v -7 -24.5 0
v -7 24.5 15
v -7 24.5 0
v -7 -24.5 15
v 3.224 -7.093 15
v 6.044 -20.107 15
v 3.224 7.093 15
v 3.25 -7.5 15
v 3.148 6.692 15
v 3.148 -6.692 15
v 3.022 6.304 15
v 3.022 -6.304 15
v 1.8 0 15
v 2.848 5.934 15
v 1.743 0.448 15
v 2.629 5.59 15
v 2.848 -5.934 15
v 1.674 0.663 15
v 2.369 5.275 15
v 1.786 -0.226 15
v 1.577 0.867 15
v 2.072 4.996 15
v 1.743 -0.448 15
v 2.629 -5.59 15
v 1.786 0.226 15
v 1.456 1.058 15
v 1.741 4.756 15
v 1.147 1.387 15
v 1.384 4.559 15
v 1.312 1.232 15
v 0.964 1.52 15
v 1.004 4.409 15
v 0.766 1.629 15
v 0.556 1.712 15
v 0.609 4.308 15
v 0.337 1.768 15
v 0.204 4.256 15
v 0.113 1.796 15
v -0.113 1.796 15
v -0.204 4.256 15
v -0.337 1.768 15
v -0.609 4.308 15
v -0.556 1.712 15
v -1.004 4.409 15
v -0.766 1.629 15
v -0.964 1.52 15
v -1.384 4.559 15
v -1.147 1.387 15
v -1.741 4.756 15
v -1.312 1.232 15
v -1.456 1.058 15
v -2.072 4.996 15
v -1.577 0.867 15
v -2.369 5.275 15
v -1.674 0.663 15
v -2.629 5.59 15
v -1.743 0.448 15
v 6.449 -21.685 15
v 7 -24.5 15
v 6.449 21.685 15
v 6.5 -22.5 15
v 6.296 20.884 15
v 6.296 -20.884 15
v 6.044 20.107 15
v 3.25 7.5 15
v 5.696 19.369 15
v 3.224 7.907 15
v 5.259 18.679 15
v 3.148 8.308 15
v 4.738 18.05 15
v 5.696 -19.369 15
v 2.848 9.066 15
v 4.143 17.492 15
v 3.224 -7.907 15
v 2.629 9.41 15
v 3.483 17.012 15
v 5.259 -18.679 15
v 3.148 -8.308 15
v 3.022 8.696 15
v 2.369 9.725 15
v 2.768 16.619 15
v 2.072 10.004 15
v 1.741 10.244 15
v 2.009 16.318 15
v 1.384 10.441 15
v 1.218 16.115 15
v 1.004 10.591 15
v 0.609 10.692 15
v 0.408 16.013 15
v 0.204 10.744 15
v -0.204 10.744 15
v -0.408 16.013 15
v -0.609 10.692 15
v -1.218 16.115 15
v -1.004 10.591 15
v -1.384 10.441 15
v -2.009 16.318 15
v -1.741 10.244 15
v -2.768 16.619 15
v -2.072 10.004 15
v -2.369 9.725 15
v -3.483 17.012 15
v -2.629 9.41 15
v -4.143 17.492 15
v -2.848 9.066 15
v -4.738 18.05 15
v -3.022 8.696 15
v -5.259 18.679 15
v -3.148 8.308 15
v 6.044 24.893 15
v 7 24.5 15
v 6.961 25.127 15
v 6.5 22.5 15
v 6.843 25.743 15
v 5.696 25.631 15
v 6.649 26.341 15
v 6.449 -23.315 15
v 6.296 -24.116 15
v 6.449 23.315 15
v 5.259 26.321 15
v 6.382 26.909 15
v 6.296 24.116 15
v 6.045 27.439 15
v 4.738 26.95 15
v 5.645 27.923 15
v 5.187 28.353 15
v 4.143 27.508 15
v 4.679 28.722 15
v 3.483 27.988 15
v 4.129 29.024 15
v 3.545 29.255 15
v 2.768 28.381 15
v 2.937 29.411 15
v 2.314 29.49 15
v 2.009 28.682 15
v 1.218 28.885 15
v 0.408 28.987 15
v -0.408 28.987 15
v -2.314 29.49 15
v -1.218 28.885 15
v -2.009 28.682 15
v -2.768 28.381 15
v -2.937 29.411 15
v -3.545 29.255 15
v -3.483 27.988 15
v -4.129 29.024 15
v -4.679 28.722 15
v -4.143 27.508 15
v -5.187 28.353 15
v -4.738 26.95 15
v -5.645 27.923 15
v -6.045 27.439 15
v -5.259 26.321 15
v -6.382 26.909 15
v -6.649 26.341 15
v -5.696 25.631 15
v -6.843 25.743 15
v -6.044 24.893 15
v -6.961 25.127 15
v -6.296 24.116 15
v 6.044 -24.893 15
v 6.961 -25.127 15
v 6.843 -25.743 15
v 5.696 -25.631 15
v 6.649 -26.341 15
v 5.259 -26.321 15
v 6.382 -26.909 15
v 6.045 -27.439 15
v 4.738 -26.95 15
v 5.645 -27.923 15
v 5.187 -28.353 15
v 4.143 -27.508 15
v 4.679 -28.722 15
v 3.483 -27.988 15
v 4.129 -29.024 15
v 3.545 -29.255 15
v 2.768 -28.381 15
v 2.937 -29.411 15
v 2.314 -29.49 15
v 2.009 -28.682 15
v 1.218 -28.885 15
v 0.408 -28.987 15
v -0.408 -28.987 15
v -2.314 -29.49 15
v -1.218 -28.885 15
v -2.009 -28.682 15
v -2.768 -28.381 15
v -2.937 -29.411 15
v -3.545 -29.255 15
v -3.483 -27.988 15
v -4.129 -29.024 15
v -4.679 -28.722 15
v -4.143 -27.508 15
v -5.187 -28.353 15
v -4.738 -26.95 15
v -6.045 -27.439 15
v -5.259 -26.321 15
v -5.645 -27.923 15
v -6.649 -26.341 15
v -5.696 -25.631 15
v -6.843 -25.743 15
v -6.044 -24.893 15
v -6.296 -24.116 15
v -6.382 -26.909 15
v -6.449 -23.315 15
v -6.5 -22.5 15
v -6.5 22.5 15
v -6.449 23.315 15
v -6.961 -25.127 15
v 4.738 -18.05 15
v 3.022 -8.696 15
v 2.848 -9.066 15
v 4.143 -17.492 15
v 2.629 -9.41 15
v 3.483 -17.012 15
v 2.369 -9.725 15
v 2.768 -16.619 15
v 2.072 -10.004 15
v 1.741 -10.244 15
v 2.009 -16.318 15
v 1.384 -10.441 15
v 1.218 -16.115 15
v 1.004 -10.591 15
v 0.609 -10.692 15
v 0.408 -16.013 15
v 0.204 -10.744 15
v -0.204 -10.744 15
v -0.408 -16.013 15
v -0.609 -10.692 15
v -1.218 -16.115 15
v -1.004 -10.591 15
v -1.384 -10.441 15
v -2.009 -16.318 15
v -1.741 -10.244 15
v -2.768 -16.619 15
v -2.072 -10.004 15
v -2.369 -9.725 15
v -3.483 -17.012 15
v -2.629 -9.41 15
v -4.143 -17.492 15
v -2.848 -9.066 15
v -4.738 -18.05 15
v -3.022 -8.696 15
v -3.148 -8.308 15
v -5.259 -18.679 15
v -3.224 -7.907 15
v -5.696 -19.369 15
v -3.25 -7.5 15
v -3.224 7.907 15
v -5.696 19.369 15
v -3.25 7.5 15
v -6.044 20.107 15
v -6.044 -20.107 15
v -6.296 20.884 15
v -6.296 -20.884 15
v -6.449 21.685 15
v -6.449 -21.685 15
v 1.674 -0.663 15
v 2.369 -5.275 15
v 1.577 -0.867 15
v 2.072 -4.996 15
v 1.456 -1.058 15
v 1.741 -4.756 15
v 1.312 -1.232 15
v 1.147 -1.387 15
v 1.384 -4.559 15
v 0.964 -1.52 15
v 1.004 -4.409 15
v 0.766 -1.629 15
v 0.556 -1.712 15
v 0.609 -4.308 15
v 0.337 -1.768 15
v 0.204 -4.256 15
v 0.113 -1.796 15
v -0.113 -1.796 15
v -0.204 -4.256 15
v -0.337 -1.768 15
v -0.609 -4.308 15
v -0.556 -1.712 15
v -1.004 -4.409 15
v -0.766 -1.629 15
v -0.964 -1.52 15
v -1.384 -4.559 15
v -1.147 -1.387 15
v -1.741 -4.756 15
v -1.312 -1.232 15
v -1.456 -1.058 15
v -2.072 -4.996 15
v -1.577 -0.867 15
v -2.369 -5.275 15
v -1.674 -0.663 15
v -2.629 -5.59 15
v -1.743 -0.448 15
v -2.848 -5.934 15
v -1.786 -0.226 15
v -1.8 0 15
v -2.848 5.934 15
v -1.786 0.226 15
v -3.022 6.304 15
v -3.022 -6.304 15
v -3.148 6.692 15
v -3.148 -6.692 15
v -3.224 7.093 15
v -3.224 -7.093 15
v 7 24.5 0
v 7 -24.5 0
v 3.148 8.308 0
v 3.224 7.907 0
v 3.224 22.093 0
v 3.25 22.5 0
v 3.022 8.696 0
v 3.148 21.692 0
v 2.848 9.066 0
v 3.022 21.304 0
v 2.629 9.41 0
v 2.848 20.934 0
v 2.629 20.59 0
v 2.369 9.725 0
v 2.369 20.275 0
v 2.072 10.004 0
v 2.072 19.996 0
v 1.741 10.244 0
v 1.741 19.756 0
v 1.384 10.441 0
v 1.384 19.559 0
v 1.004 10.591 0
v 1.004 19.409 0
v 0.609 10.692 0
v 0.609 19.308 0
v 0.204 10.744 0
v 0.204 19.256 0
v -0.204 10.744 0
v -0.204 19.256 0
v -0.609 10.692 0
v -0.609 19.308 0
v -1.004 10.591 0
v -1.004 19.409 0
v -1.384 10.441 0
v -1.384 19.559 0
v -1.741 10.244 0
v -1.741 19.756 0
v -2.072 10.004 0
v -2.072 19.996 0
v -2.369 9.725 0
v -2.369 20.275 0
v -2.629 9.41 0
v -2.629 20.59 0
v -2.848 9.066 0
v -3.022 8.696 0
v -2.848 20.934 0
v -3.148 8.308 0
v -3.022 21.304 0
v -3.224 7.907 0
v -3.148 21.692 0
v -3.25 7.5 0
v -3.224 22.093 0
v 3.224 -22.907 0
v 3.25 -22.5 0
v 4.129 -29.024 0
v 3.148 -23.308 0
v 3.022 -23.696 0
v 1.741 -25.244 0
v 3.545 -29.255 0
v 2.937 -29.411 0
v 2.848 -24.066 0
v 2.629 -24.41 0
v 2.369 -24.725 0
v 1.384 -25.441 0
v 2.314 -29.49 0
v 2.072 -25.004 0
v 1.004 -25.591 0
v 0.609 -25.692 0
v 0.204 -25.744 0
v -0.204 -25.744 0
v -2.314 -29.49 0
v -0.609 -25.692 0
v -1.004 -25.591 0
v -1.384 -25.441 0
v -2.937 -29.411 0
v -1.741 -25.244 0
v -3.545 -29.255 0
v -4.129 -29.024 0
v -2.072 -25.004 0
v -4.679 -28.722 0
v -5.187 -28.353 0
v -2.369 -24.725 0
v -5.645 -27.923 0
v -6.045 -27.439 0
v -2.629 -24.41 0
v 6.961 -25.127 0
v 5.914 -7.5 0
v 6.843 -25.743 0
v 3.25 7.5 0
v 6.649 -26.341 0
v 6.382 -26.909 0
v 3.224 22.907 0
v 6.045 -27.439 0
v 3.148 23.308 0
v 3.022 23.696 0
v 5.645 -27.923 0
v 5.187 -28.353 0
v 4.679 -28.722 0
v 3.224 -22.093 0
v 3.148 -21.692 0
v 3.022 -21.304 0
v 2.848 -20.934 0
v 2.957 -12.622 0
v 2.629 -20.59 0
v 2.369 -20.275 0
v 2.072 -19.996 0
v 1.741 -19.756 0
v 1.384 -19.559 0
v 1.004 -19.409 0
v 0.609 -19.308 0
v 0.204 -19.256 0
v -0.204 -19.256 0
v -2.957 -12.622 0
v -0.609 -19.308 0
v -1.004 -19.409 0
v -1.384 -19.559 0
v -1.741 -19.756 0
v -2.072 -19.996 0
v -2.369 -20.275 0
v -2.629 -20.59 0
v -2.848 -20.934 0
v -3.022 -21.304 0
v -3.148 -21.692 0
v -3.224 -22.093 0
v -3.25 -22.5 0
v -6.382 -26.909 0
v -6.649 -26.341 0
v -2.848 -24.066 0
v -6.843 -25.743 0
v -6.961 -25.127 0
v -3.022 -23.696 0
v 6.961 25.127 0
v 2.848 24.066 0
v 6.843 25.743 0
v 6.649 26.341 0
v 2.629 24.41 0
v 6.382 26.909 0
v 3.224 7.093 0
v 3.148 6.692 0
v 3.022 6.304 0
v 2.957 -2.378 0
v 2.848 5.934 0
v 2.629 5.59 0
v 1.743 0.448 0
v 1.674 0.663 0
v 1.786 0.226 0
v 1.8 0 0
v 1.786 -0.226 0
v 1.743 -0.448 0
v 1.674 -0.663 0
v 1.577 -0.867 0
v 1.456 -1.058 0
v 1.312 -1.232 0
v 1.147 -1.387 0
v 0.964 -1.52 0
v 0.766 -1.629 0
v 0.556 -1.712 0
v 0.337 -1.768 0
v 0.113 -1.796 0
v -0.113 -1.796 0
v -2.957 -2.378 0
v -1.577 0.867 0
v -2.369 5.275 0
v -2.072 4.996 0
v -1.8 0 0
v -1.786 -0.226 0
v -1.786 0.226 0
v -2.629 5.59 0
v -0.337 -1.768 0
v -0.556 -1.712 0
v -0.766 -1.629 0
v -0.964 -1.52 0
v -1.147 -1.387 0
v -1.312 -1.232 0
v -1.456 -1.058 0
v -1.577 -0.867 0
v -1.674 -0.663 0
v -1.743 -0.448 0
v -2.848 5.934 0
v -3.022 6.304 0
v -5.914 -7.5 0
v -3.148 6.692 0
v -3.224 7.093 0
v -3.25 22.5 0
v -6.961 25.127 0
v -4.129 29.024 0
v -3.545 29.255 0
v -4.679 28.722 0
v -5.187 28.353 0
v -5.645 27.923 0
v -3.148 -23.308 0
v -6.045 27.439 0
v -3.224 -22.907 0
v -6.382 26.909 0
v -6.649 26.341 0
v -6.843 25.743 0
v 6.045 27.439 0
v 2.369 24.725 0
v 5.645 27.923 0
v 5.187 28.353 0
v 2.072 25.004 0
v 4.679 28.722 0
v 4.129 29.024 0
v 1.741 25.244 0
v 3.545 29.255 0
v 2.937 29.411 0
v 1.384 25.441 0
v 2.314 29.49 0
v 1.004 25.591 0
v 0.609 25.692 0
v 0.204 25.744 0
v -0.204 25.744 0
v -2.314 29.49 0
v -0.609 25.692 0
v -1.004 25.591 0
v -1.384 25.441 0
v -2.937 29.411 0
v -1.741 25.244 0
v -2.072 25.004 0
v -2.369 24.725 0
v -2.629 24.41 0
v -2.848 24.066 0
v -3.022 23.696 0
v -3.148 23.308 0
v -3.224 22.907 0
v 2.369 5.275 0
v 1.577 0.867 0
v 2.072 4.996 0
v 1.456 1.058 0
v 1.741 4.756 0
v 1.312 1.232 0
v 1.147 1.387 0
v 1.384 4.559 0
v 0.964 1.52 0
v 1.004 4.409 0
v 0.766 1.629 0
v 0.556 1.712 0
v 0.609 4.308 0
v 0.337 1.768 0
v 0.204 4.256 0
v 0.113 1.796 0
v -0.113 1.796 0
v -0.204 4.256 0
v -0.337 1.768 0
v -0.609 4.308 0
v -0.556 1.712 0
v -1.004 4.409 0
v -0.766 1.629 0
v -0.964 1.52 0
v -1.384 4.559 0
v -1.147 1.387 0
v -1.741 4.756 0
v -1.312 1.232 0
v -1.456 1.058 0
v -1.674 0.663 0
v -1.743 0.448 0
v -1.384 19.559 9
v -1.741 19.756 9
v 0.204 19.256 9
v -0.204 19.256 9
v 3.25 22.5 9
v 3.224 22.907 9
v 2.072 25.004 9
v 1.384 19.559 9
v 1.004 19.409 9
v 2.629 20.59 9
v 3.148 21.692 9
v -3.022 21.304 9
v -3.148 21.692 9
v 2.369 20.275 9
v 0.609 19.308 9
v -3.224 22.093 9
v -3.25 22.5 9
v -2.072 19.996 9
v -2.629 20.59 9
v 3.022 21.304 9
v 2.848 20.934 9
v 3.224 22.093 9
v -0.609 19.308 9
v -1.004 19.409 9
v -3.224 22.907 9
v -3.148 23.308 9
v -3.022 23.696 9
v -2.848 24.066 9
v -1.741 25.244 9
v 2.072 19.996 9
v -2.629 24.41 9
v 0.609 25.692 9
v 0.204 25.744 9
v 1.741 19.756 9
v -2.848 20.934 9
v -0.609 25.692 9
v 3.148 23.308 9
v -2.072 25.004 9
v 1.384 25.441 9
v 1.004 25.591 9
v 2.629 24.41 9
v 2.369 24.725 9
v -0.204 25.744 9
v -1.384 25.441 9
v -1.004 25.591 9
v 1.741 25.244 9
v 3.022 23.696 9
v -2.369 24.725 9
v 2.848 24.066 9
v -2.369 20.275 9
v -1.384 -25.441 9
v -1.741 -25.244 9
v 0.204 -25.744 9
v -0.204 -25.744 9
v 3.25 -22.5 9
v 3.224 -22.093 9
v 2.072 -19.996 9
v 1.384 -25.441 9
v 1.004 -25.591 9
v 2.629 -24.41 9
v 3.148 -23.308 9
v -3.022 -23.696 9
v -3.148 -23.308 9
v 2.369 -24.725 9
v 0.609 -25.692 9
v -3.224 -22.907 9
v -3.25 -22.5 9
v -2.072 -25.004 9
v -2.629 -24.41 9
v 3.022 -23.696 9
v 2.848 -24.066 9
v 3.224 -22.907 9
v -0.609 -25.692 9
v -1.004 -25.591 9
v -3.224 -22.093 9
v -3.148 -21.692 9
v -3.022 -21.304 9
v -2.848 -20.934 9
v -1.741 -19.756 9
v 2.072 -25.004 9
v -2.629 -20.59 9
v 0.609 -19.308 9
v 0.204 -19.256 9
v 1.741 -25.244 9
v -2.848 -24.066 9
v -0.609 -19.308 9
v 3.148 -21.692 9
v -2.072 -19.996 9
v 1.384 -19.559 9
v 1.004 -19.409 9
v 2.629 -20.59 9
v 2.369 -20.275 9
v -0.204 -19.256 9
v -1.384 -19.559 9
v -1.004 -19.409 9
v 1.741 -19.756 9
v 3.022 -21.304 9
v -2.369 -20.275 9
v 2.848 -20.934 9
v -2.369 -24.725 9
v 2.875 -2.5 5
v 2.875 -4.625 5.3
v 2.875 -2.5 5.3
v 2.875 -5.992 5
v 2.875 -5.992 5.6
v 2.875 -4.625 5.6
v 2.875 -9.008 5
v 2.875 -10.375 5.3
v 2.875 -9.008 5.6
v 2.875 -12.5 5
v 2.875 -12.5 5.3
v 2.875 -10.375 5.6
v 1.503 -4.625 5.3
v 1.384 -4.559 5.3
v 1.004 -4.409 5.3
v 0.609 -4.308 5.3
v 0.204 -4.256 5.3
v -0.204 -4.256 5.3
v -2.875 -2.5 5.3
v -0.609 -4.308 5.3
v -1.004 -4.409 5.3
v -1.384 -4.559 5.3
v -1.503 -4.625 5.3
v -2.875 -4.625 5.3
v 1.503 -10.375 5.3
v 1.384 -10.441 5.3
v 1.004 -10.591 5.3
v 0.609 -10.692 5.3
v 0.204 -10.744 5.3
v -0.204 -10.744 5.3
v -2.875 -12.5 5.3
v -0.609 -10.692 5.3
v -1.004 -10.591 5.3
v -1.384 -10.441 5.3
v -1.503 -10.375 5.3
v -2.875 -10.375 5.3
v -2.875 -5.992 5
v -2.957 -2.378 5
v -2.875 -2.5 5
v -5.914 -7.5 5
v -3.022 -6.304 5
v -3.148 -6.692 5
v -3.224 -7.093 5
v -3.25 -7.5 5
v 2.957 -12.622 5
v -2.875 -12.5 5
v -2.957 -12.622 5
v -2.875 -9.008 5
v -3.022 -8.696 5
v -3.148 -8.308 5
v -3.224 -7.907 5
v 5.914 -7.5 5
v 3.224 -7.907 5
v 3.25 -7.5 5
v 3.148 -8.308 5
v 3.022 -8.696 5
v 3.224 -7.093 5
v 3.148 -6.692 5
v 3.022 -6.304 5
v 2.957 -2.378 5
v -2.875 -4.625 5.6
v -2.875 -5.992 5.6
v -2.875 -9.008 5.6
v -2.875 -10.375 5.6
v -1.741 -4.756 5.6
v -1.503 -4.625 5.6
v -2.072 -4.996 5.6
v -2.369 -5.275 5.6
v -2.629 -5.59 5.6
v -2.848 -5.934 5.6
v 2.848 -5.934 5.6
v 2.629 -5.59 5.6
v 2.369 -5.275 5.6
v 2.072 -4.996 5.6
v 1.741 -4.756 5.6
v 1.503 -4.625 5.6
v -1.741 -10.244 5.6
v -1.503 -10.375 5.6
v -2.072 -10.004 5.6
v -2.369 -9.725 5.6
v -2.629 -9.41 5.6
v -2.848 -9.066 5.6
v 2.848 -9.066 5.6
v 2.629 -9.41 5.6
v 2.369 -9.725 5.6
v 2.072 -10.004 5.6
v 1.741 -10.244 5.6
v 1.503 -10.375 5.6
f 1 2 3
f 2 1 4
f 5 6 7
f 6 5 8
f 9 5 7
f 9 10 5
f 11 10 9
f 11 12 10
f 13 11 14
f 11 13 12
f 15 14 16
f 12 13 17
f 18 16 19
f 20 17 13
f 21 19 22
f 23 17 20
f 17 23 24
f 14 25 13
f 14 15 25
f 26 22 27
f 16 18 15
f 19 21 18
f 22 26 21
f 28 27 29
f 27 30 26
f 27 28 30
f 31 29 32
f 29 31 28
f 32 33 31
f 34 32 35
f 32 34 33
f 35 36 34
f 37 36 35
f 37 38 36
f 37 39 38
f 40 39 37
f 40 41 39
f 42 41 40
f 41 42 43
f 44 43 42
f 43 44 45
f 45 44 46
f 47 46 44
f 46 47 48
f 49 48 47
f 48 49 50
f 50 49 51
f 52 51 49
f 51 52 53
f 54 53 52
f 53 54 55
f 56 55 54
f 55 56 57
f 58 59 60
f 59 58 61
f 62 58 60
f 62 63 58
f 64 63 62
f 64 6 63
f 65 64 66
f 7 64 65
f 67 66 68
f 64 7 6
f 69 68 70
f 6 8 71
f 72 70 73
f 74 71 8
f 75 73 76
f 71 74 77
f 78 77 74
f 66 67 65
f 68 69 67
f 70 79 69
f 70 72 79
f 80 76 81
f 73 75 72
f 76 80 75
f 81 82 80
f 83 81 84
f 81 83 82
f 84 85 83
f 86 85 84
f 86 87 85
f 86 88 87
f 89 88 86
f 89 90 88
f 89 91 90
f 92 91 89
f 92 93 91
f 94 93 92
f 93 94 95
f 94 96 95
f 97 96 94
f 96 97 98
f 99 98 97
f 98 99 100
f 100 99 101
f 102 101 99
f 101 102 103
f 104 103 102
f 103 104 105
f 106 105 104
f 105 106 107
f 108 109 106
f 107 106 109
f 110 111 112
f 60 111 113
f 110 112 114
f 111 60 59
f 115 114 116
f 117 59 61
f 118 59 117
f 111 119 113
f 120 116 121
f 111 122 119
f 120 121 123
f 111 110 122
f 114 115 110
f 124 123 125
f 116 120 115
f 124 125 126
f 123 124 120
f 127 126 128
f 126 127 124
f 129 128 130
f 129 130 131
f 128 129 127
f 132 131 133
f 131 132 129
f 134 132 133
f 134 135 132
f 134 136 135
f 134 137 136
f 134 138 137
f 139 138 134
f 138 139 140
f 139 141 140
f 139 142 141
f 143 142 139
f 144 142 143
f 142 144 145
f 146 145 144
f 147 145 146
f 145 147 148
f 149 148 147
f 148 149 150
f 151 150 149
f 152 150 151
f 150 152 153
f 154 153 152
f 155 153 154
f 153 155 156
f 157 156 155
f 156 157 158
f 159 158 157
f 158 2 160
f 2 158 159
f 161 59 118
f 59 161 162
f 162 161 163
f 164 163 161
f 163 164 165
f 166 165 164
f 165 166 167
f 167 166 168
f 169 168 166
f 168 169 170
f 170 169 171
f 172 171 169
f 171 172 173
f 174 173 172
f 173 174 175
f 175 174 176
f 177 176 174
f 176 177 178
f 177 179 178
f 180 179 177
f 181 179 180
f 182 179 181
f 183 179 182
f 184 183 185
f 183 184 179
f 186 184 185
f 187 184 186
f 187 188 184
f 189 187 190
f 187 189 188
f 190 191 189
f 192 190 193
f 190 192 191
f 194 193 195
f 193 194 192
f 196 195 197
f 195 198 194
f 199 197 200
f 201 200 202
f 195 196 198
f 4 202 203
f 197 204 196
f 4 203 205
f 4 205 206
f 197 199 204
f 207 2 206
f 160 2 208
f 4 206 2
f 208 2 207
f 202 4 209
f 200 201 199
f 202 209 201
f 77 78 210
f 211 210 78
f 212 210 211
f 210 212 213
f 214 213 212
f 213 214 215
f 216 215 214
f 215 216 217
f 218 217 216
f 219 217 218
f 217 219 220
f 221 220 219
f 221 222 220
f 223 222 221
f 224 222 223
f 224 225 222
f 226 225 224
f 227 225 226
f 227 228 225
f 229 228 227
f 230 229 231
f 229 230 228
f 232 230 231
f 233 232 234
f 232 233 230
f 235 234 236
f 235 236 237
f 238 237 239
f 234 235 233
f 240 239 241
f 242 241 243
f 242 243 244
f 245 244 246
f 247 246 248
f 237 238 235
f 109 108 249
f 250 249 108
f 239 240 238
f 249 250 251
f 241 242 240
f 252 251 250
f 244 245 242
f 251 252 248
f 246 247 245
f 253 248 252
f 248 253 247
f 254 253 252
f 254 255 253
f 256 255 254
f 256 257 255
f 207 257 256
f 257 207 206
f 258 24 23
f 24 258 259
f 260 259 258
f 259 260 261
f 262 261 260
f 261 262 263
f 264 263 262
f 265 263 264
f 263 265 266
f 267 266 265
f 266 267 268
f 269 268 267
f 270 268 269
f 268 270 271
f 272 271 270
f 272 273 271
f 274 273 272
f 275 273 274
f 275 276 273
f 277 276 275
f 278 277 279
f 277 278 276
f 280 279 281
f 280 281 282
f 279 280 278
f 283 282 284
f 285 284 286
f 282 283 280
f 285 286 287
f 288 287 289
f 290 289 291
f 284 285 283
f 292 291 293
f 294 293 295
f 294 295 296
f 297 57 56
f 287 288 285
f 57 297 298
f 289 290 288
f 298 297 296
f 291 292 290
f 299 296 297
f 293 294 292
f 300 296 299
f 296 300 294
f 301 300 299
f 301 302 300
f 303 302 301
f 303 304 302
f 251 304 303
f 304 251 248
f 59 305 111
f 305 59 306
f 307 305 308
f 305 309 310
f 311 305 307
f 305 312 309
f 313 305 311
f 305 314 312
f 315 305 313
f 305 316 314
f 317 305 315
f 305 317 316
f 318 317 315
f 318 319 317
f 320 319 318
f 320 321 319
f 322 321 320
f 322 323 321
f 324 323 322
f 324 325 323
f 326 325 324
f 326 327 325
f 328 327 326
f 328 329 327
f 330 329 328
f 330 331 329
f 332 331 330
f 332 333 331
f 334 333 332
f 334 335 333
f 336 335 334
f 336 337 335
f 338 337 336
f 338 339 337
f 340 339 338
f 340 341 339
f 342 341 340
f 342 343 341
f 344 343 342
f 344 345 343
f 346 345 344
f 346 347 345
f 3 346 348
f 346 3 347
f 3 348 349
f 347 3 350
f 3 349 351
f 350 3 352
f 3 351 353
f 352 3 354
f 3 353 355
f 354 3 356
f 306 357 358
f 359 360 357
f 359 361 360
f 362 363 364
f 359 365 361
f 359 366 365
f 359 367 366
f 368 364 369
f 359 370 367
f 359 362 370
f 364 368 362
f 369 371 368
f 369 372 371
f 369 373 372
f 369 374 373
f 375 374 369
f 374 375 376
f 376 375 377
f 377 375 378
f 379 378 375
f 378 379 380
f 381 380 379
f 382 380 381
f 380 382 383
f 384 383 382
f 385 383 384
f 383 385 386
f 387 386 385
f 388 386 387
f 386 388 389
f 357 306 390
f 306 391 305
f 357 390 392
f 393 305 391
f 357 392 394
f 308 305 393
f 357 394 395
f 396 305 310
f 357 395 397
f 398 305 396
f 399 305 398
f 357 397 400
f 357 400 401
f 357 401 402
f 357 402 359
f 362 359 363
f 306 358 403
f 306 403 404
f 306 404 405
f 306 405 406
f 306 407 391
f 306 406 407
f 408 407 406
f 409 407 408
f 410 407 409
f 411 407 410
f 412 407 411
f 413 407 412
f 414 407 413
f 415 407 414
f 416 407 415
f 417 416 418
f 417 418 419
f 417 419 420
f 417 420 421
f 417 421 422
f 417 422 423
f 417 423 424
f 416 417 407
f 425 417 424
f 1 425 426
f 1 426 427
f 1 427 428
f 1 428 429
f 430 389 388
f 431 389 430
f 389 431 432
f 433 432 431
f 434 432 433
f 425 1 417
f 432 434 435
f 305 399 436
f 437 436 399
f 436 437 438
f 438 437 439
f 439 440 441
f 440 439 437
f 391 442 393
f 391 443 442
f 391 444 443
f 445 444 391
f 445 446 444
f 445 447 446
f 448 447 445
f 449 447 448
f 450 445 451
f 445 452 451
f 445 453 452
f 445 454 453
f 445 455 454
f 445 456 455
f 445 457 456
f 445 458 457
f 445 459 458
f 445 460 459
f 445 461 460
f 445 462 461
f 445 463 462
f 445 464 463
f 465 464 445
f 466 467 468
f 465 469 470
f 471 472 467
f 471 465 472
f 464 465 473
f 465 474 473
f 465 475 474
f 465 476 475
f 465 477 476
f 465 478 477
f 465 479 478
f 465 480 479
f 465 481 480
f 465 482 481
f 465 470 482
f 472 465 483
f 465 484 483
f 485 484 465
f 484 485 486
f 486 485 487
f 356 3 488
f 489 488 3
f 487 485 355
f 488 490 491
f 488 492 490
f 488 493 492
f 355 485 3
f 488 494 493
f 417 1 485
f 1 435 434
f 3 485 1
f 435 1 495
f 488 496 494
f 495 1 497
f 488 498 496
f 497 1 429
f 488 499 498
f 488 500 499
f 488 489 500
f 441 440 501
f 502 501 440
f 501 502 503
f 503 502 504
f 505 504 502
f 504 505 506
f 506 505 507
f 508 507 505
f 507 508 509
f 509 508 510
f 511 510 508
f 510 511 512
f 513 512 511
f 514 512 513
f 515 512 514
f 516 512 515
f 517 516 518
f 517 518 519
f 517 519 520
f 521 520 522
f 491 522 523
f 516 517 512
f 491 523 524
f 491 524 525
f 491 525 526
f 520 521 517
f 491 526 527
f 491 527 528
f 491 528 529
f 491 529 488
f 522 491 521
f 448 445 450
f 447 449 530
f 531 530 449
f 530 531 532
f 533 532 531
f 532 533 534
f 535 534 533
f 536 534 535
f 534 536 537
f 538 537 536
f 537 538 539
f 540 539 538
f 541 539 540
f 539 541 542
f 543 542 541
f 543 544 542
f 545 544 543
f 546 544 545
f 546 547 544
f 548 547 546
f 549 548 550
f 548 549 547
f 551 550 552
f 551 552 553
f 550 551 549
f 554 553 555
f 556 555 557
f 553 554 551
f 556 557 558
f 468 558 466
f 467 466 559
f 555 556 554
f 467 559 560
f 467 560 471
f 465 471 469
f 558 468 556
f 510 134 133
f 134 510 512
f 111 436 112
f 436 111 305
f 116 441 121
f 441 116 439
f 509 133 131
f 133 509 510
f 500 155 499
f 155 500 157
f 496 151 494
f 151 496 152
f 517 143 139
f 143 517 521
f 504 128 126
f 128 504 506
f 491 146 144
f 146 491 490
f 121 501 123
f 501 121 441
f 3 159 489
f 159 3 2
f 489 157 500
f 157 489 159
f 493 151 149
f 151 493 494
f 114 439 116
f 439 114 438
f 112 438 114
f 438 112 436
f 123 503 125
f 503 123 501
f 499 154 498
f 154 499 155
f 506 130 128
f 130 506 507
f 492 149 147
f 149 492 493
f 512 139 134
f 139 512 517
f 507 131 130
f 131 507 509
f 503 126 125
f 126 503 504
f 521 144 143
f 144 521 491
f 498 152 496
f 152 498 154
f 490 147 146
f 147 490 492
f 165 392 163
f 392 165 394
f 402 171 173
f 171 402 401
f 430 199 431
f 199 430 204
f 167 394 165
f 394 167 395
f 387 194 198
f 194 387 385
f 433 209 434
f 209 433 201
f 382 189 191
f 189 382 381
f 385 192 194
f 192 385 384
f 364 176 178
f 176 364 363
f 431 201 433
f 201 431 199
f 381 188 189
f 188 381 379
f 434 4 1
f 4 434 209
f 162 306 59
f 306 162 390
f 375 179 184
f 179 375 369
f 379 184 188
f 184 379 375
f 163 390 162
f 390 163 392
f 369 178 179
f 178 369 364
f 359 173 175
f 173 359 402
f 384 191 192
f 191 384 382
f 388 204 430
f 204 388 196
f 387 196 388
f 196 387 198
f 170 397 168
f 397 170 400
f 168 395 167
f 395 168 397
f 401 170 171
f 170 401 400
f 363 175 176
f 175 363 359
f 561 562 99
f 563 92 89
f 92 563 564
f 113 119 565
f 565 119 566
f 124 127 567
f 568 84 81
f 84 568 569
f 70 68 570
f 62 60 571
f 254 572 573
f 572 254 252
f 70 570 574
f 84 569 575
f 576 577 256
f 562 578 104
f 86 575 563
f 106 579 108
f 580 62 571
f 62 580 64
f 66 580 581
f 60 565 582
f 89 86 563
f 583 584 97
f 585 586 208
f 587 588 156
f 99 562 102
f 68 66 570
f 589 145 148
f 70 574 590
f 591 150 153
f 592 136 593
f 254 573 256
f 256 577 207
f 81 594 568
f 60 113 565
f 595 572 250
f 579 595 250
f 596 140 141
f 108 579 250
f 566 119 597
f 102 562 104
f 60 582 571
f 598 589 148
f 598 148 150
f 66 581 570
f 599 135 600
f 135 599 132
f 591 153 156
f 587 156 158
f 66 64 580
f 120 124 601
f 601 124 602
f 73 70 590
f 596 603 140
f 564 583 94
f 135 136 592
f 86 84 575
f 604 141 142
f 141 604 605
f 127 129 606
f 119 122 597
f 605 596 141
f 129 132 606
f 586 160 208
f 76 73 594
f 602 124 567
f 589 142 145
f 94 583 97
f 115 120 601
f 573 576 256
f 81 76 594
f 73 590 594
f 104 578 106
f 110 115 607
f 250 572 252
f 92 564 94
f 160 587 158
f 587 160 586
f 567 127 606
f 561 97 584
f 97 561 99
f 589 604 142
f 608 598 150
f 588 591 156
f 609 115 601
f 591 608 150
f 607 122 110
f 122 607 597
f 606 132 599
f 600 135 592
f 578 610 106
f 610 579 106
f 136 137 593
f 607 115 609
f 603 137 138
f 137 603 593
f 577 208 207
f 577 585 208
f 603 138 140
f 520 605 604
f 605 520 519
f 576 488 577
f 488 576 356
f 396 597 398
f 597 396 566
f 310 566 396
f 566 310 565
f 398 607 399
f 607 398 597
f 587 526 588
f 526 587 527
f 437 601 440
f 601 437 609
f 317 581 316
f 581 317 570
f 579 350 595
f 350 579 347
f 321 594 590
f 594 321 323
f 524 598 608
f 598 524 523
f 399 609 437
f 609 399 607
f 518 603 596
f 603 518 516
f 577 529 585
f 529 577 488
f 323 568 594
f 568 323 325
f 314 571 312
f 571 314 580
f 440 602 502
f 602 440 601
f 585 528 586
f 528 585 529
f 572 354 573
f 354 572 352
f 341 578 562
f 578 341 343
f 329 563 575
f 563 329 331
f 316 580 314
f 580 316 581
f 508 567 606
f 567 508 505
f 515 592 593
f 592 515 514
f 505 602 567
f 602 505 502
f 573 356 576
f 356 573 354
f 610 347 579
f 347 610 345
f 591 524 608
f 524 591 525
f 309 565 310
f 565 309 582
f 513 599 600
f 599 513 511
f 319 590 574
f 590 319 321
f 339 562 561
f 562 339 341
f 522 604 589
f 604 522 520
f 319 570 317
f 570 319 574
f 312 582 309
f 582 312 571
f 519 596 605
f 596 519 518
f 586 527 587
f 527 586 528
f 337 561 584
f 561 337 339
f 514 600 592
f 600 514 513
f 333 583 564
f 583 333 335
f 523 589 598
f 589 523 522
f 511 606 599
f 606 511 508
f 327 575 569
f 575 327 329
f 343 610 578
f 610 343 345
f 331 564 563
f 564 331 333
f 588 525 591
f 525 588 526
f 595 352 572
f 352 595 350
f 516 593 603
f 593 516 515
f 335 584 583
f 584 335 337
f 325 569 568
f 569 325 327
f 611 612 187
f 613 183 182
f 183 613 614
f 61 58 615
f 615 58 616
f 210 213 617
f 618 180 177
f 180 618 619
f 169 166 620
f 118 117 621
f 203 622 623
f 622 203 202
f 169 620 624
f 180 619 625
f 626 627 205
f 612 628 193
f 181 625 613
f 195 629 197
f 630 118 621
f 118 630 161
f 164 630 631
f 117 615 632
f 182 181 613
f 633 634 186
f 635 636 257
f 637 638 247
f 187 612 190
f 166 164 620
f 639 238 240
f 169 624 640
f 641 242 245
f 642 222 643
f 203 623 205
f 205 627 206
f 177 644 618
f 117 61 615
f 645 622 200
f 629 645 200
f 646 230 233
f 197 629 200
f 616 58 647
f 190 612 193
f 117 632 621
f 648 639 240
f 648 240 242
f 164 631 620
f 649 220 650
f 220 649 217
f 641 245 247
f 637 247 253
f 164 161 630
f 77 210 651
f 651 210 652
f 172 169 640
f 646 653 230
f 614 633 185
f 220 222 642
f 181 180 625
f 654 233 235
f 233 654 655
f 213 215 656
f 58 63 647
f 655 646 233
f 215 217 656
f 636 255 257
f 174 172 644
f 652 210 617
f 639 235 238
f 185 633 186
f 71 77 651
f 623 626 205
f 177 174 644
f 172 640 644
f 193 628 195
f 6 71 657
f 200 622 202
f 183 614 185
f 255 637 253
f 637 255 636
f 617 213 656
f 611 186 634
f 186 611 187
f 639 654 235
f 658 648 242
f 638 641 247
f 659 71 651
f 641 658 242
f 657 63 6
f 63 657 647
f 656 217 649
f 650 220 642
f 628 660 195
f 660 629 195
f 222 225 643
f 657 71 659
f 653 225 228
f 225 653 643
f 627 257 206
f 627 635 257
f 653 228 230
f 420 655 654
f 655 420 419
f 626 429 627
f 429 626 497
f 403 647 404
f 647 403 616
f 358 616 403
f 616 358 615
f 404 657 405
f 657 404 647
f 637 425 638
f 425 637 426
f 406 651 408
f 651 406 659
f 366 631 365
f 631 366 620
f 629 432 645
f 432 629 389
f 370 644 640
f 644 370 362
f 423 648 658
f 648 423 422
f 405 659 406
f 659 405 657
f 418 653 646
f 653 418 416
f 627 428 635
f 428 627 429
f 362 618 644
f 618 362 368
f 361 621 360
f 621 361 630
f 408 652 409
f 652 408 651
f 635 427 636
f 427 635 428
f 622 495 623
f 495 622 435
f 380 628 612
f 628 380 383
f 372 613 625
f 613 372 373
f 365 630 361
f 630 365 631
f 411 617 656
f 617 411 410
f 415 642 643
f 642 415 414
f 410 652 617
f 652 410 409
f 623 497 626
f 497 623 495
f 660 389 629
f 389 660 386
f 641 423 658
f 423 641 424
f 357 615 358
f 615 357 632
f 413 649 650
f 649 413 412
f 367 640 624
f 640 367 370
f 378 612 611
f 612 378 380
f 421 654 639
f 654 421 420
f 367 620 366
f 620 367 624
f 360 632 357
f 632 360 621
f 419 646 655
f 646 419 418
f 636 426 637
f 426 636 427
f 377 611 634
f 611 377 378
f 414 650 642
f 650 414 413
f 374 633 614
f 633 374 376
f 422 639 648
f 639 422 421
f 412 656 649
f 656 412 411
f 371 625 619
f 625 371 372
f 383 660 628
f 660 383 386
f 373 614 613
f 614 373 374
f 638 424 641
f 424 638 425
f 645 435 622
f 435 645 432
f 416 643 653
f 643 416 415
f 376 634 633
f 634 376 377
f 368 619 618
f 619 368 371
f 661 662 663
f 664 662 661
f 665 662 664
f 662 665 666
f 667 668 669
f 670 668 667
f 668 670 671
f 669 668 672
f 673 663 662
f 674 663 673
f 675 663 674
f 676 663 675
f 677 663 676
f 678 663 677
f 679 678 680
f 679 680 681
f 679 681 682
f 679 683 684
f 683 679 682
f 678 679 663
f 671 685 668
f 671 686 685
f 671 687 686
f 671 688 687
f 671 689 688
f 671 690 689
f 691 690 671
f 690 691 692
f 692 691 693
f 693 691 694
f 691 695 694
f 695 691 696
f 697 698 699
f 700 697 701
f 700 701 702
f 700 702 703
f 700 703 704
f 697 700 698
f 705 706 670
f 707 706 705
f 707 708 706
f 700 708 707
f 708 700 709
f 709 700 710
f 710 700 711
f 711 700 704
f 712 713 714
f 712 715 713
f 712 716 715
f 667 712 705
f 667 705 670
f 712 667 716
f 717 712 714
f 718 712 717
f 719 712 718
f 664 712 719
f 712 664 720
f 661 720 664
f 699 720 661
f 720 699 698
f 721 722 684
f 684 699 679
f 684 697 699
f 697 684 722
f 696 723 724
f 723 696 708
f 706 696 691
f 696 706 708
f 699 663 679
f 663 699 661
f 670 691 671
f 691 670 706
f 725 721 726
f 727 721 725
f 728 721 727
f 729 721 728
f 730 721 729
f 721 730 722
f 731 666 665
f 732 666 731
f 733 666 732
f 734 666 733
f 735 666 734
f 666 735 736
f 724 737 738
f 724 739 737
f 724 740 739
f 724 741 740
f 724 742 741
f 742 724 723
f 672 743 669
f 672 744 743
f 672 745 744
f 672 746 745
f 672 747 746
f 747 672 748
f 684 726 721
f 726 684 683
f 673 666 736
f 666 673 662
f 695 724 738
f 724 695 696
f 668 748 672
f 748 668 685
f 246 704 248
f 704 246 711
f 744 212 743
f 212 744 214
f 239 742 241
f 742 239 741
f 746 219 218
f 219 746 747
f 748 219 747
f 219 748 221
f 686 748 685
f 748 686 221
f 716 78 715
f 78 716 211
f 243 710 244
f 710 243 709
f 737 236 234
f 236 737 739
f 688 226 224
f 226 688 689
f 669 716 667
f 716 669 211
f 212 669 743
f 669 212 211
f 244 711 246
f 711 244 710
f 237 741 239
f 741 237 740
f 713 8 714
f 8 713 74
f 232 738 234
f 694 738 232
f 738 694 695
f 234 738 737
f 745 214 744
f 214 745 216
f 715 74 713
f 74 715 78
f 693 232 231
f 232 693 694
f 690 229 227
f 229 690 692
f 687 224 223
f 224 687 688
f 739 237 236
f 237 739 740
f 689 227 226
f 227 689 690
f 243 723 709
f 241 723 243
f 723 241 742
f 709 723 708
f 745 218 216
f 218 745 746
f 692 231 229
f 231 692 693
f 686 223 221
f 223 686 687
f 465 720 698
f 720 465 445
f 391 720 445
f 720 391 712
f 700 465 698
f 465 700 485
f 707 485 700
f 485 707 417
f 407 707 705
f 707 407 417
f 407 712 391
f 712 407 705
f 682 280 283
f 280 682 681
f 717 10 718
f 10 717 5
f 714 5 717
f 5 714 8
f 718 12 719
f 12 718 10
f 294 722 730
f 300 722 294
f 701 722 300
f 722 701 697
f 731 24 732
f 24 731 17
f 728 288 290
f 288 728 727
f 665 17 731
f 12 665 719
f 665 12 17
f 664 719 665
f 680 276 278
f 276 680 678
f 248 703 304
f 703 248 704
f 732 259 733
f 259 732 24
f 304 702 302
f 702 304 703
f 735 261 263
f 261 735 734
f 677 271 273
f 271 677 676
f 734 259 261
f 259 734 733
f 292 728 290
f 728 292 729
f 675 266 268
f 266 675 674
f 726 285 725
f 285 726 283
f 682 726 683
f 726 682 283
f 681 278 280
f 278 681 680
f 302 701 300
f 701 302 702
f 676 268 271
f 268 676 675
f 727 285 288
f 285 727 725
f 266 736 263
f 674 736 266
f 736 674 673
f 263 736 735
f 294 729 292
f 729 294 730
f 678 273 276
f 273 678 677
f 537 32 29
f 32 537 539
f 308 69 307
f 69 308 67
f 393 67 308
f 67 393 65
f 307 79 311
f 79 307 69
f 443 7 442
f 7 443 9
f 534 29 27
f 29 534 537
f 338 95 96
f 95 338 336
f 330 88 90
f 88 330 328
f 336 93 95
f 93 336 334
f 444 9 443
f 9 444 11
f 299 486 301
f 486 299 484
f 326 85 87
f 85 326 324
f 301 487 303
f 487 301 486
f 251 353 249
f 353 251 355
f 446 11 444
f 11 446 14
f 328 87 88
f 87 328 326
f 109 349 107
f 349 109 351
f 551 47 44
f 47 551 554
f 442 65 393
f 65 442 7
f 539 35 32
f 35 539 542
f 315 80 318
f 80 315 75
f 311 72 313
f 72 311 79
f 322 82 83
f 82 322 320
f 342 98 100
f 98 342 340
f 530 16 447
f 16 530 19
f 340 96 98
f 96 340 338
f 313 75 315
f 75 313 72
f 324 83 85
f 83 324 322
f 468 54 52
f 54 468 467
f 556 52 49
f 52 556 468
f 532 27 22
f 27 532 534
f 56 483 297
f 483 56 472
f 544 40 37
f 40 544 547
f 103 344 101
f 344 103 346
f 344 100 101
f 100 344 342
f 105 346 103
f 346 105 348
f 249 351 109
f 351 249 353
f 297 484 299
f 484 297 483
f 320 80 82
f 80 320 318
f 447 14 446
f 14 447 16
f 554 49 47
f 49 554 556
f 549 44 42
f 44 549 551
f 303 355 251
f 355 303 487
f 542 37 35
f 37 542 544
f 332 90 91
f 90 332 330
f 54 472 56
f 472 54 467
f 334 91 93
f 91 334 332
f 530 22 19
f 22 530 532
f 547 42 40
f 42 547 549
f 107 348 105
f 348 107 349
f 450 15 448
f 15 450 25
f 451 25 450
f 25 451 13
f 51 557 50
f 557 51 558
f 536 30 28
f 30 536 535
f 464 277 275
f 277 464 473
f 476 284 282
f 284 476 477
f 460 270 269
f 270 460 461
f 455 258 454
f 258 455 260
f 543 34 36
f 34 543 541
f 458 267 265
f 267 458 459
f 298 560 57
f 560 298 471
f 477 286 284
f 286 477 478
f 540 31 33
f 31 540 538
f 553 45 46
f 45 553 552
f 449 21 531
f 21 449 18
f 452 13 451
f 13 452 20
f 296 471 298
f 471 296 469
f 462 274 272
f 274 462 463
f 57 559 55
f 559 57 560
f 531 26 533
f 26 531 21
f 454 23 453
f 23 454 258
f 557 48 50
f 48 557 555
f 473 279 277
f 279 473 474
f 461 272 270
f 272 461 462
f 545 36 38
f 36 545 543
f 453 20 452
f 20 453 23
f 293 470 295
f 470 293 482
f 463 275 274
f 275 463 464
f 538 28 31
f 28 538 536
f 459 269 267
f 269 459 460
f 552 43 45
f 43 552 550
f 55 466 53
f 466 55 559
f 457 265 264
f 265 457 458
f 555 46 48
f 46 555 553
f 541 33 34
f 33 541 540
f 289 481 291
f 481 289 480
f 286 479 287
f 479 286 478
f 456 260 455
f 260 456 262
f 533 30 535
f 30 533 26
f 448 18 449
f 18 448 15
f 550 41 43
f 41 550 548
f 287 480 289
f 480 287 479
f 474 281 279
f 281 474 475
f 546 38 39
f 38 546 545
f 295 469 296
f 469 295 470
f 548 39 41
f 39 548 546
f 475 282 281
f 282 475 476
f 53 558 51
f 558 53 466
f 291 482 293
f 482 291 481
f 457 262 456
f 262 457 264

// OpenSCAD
$fn = 50;


difference() {
	union() {
		hull() {
			translate(v = [-2.0000000000, 9.5000000000, 0]) {
				cylinder(h = 15, r = 5);
			}
			translate(v = [2.0000000000, 9.5000000000, 0]) {
				cylinder(h = 15, r = 5);
			}
			translate(v = [-2.0000000000, -9.5000000000, 0]) {
				cylinder(h = 15, r = 5);
			}
			translate(v = [2.0000000000, -9.5000000000, 0]) {
				cylinder(h = 15, r = 5);
			}
		}
		translate(v = [0.0000000000, 15.0000000000, 0]) {
			hull() {
				translate(v = [-2.0000000000, 9.5000000000, 0]) {
					cylinder(h = 15, r = 5);
				}
				translate(v = [2.0000000000, 9.5000000000, 0]) {
					cylinder(h = 15, r = 5);
				}
				translate(v = [-2.0000000000, -9.5000000000, 0]) {
					cylinder(h = 15, r = 5);
				}
				translate(v = [2.0000000000, -9.5000000000, 0]) {
					cylinder(h = 15, r = 5);
				}
			}
		}
		translate(v = [0.0000000000, 15.0000000000, 0]) {
			hull() {
				translate(v = [-2.0000000000, 9.5000000000, 0]) {
					cylinder(h = 15, r = 5);
				}
				translate(v = [2.0000000000, 9.5000000000, 0]) {
					cylinder(h = 15, r = 5);
				}
				translate(v = [-2.0000000000, -9.5000000000, 0]) {
					cylinder(h = 15, r = 5);
				}
				translate(v = [2.0000000000, -9.5000000000, 0]) {
					cylinder(h = 15, r = 5);
				}
			}
		}
		translate(v = [0.0000000000, -15.0000000000, 0]) {
			hull() {
				translate(v = [-2.0000000000, 9.5000000000, 0]) {
					cylinder(h = 15, r = 5);
				}
				translate(v = [2.0000000000, 9.5000000000, 0]) {
					cylinder(h = 15, r = 5);
				}
				translate(v = [-2.0000000000, -9.5000000000, 0]) {
					cylinder(h = 15, r = 5);
				}
				translate(v = [2.0000000000, -9.5000000000, 0]) {
					cylinder(h = 15, r = 5);
				}
			}
		}
		translate(v = [0.0000000000, -15.0000000000, 0]) {
			hull() {
				translate(v = [-2.0000000000, 9.5000000000, 0]) {
					cylinder(h = 15, r = 5);
				}
				translate(v = [2.0000000000, 9.5000000000, 0]) {
					cylinder(h = 15, r = 5);
				}
				translate(v = [-2.0000000000, -9.5000000000, 0]) {
					cylinder(h = 15, r = 5);
				}
				translate(v = [2.0000000000, -9.5000000000, 0]) {
					cylinder(h = 15, r = 5);
				}
			}
		}
	}
	union() {
		translate(v = [0.0000000000, 22.5000000000, 15]) {
			rotate(a = [0, 0, 0]) {
				difference() {
					union() {
						#translate(v = [0, 0, -15.0000000000]) {
							cylinder(h = 15, r = 2.2500000000);
						}
						#translate(v = [0, 0, -6]) {
							cylinder(h = 6, r1 = 3.2500000000, r2 = 6.5000000000);
						}
						#translate(v = [0, 0, -15.0000000000]) {
							cylinder(h = 15, r = 3.2500000000);
						}
						#translate(v = [0, 0, -15.0000000000]) {
							cylinder(h = 15, r = 2.2500000000);
						}
					}
					union();
				}
			}
		}
		translate(v = [0.0000000000, 22.5000000000, 15]) {
			rotate(a = [0, 0, 0]) {
				difference() {
					union() {
						#translate(v = [0, 0, -15.0000000000]) {
							cylinder(h = 15, r = 2.2500000000);
						}
						#translate(v = [0, 0, -6]) {
							cylinder(h = 6, r1 = 3.2500000000, r2 = 6.5000000000);
						}
						#translate(v = [0, 0, -15.0000000000]) {
							cylinder(h = 15, r = 3.2500000000);
						}
						#translate(v = [0, 0, -15.0000000000]) {
							cylinder(h = 15, r = 2.2500000000);
						}
					}
					union();
				}
			}
		}
		translate(v = [0.0000000000, -22.5000000000, 15]) {
			rotate(a = [0, 0, 0]) {
				difference() {
					union() {
						#translate(v = [0, 0, -15.0000000000]) {
							cylinder(h = 15, r = 2.2500000000);
						}
						#translate(v = [0, 0, -6]) {
							cylinder(h = 6, r1 = 3.2500000000, r2 = 6.5000000000);
						}
						#translate(v = [0, 0, -15.0000000000]) {
							cylinder(h = 15, r = 3.2500000000);
						}
						#translate(v = [0, 0, -15.0000000000]) {
							cylinder(h = 15, r = 2.2500000000);
						}
					}
					union();
				}
			}
		}
		translate(v = [0.0000000000, -22.5000000000, 15]) {
			rotate(a = [0, 0, 0]) {
				difference() {
					union() {
						#translate(v = [0, 0, -15.0000000000]) {
							cylinder(h = 15, r = 2.2500000000);
						}
						#translate(v = [0, 0, -6]) {
							cylinder(h = 6, r1 = 3.2500000000, r2 = 6.5000000000);
						}
						#translate(v = [0, 0, -15.0000000000]) {
							cylinder(h = 15, r = 3.2500000000);
						}
						#translate(v = [0, 0, -15.0000000000]) {
							cylinder(h = 15, r = 2.2500000000);
						}
					}
					union();
				}
			}
		}
		translate(v = [0.0000000000, -7.5000000000, 0]) {
			rotate(a = [0, 0, 0]) {
				difference() {
					union() {
						#translate(v = [-2.8750000000, -5.0000000000, -0.3000000000]) {
							cube(size = [5.7500000000, 10, 0.3000000000]);
						}
						#translate(v = [-2.8750000000, -2.8750000000, -0.6000000000]) {
							cube(size = [5.7500000000, 5.7500000000, 0.3000000000]);
						}
						#translate(v = [-2.8750000000, -5.0000000000, 5]) {
							cube(size = [5.7500000000, 10, 0.3000000000]);
						}
						#translate(v = [-2.8750000000, -2.8750000000, 5.3000000000]) {
							cube(size = [5.7500000000, 5.7500000000, 0.3000000000]);
						}
						#translate(v = [0, 0, -100.0000000000]) {
							cylinder(h = 200, r = 3.2500000000);
						}
						#linear_extrude(height = 5) {
							polygon(points = [[5.9142500000, 0.0000000000], [2.9571250000, 5.1218907443], [-2.9571250000, 5.1218907443], [-5.9142500000, 0.0000000000], [-2.9571250000, -5.1218907443], [2.9571250000, -5.1218907443]]);
						}
						#translate(v = [-2.8750000000, -5.0000000000, -0.3000000000]) {
							cube(size = [5.7500000000, 10, 0.3000000000]);
						}
						#translate(v = [-2.8750000000, -2.8750000000, -0.6000000000]) {
							cube(size = [5.7500000000, 5.7500000000, 0.3000000000]);
						}
						#translate(v = [-2.8750000000, -5.0000000000, 5]) {
							cube(size = [5.7500000000, 10, 0.3000000000]);
						}
						#translate(v = [-2.8750000000, -2.8750000000, 5.3000000000]) {
							cube(size = [5.7500000000, 5.7500000000, 0.3000000000]);
						}
						#translate(v = [0, 0, -100.0000000000]) {
							cylinder(h = 200, r = 3.2500000000);
						}
						#translate(v = [-2.8750000000, -5.0000000000, -0.3000000000]) {
							cube(size = [5.7500000000, 10, 0.3000000000]);
						}
						#translate(v = [-2.8750000000, -2.8750000000, -0.6000000000]) {
							cube(size = [5.7500000000, 5.7500000000, 0.3000000000]);
						}
						#translate(v = [-2.8750000000, -5.0000000000, 5]) {
							cube(size = [5.7500000000, 10, 0.3000000000]);
						}
						#translate(v = [-2.8750000000, -2.8750000000, 5.3000000000]) {
							cube(size = [5.7500000000, 5.7500000000, 0.3000000000]);
						}
						#translate(v = [0, 0, -100.0000000000]) {
							cylinder(h = 200, r = 3.2500000000);
						}
					}
					union();
				}
			}
		}
		translate(v = [0.0000000000, -7.5000000000, 0]) {
			translate(v = [0, 0, -100]) {
				cylinder(h = 200, r = 3.2500000000);
			}
		}
		translate(v = [0.0000000000, 7.5000000000, 0]) {
			translate(v = [0, 0, -100]) {
				cylinder(h = 200, r = 3.2500000000);
			}
		}
		translate(v = [0.0000000000, -7.5000000000, 0]) {
			translate(v = [0, 0, -100]) {
				cylinder(h = 200, r = 1.8000000000);
			}
		}
		translate(v = [0, 0, -100]) {
			cylinder(h = 200, r = 1.8000000000);
		}
		translate(v = [0.0000000000, 7.5000000000, 0]) {
			translate(v = [0, 0, -100]) {
				cylinder(h = 200, r = 1.8000000000);
			}
		}
	}
}
